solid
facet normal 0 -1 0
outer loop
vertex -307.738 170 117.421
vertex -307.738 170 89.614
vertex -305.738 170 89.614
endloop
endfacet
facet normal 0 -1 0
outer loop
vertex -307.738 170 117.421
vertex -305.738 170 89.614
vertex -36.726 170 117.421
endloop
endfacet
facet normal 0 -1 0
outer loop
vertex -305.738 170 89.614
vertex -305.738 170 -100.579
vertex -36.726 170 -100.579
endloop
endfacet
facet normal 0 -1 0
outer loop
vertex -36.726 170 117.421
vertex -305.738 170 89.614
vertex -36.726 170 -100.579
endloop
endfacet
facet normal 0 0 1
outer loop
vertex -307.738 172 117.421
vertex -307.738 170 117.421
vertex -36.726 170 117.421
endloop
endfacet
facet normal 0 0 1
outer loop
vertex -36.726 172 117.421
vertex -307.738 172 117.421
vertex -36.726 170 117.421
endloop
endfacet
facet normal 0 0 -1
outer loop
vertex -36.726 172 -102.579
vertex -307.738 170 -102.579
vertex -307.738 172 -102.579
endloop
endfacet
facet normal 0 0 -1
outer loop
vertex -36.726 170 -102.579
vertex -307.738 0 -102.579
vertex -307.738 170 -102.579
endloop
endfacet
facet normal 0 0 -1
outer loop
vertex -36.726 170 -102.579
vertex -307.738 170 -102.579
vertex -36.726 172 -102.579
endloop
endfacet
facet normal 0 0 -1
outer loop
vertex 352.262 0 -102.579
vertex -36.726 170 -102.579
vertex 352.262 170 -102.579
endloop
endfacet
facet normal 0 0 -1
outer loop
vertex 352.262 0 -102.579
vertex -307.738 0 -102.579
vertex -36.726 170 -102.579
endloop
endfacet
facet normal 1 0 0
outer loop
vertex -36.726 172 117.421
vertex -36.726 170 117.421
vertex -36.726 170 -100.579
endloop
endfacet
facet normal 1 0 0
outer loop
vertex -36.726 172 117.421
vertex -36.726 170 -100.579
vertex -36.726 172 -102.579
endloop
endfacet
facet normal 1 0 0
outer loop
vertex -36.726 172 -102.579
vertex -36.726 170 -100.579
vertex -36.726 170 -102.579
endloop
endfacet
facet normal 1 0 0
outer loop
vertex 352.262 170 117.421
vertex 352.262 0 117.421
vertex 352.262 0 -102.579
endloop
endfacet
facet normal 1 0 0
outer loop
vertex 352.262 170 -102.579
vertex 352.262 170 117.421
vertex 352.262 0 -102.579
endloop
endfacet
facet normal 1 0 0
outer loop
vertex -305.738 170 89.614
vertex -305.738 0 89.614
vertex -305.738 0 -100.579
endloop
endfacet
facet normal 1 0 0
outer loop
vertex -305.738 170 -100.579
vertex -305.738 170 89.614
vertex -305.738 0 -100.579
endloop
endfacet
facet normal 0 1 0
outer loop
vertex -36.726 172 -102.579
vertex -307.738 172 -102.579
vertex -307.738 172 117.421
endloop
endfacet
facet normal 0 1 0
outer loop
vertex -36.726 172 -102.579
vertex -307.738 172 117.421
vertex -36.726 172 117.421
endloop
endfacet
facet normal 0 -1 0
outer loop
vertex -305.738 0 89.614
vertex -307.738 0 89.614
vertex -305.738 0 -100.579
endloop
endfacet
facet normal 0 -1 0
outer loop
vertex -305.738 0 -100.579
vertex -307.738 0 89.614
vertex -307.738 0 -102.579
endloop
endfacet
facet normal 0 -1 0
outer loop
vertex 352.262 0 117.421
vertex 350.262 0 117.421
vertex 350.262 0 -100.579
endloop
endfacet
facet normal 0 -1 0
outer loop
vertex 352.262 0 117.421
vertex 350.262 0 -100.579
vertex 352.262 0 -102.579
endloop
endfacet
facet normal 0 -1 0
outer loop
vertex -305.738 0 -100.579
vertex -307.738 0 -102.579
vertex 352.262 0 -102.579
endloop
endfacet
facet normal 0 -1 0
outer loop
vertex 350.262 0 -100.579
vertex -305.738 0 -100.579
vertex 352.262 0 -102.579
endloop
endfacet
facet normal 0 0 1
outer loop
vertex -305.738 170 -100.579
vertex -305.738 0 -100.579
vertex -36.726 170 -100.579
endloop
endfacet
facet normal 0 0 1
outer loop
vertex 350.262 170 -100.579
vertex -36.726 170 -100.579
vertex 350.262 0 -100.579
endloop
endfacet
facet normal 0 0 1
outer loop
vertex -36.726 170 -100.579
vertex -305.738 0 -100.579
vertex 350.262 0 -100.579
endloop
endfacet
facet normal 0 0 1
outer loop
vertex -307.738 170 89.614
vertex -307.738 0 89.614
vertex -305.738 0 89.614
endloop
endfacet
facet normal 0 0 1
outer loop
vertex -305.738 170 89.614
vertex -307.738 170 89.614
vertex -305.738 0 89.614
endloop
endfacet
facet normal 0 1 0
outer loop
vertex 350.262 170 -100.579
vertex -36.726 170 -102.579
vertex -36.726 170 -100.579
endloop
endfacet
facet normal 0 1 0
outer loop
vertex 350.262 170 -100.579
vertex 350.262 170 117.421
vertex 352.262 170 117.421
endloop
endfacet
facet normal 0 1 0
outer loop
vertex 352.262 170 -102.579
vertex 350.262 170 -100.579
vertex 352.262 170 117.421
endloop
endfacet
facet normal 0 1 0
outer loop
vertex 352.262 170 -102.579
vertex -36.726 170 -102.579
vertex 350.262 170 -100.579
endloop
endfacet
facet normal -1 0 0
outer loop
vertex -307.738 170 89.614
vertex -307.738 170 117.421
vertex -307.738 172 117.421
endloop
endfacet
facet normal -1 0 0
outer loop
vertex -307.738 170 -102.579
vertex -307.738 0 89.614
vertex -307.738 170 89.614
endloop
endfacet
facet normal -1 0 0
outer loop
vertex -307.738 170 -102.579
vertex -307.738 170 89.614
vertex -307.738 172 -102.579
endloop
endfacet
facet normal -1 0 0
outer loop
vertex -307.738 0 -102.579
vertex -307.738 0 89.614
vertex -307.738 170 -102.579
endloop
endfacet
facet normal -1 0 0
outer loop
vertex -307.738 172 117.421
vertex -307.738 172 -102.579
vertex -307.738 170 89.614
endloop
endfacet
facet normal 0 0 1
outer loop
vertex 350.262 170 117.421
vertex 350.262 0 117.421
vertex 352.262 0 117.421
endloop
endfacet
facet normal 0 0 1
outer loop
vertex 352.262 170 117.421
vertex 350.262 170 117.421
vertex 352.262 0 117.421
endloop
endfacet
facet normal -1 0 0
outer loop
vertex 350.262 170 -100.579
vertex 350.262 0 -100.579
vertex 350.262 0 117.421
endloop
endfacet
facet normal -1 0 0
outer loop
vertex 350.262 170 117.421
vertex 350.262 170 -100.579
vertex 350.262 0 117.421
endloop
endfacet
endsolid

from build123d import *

# Parameters (mm, degrees)
SALIENTE_EXTRUIR1_DEPTH = 170
CROQUIS2_W              = 271.012090605
CROQUIS2_H              = 220
SALIENTE_EXTRUIR2_DEPTH = 2


with BuildPart() as part:
    # Croquis1 → Saliente-Extruir1 (new body)
    with BuildSketch(Plane(origin=(0, 0, 0), x_dir=(1, 0, 0), z_dir=(0, 1, 0))):
        Polygon((-305.737821636, -89.613714521), (-305.737821636, 100.579273879), (350.262178364, 100.579273879), (350.262178364, -117.420726121), (352.262178364, -117.420726121), (352.262178364, 102.579273879), (-307.737821636, 102.579273879), (-307.737821636, -89.613714521), align=None)
    extrude(amount=SALIENTE_EXTRUIR1_DEPTH)

    # Croquis2 → Saliente-Extruir2 (add)
    with BuildSketch(Plane(origin=(0, 170, 0), x_dir=(1, 0, 0), z_dir=(0, 1, 0))):
        with Locations((-172.231776334, -7.420726121)):
            Rectangle(CROQUIS2_W, CROQUIS2_H)
    extrude(amount=SALIENTE_EXTRUIR2_DEPTH)


solid = part.part
